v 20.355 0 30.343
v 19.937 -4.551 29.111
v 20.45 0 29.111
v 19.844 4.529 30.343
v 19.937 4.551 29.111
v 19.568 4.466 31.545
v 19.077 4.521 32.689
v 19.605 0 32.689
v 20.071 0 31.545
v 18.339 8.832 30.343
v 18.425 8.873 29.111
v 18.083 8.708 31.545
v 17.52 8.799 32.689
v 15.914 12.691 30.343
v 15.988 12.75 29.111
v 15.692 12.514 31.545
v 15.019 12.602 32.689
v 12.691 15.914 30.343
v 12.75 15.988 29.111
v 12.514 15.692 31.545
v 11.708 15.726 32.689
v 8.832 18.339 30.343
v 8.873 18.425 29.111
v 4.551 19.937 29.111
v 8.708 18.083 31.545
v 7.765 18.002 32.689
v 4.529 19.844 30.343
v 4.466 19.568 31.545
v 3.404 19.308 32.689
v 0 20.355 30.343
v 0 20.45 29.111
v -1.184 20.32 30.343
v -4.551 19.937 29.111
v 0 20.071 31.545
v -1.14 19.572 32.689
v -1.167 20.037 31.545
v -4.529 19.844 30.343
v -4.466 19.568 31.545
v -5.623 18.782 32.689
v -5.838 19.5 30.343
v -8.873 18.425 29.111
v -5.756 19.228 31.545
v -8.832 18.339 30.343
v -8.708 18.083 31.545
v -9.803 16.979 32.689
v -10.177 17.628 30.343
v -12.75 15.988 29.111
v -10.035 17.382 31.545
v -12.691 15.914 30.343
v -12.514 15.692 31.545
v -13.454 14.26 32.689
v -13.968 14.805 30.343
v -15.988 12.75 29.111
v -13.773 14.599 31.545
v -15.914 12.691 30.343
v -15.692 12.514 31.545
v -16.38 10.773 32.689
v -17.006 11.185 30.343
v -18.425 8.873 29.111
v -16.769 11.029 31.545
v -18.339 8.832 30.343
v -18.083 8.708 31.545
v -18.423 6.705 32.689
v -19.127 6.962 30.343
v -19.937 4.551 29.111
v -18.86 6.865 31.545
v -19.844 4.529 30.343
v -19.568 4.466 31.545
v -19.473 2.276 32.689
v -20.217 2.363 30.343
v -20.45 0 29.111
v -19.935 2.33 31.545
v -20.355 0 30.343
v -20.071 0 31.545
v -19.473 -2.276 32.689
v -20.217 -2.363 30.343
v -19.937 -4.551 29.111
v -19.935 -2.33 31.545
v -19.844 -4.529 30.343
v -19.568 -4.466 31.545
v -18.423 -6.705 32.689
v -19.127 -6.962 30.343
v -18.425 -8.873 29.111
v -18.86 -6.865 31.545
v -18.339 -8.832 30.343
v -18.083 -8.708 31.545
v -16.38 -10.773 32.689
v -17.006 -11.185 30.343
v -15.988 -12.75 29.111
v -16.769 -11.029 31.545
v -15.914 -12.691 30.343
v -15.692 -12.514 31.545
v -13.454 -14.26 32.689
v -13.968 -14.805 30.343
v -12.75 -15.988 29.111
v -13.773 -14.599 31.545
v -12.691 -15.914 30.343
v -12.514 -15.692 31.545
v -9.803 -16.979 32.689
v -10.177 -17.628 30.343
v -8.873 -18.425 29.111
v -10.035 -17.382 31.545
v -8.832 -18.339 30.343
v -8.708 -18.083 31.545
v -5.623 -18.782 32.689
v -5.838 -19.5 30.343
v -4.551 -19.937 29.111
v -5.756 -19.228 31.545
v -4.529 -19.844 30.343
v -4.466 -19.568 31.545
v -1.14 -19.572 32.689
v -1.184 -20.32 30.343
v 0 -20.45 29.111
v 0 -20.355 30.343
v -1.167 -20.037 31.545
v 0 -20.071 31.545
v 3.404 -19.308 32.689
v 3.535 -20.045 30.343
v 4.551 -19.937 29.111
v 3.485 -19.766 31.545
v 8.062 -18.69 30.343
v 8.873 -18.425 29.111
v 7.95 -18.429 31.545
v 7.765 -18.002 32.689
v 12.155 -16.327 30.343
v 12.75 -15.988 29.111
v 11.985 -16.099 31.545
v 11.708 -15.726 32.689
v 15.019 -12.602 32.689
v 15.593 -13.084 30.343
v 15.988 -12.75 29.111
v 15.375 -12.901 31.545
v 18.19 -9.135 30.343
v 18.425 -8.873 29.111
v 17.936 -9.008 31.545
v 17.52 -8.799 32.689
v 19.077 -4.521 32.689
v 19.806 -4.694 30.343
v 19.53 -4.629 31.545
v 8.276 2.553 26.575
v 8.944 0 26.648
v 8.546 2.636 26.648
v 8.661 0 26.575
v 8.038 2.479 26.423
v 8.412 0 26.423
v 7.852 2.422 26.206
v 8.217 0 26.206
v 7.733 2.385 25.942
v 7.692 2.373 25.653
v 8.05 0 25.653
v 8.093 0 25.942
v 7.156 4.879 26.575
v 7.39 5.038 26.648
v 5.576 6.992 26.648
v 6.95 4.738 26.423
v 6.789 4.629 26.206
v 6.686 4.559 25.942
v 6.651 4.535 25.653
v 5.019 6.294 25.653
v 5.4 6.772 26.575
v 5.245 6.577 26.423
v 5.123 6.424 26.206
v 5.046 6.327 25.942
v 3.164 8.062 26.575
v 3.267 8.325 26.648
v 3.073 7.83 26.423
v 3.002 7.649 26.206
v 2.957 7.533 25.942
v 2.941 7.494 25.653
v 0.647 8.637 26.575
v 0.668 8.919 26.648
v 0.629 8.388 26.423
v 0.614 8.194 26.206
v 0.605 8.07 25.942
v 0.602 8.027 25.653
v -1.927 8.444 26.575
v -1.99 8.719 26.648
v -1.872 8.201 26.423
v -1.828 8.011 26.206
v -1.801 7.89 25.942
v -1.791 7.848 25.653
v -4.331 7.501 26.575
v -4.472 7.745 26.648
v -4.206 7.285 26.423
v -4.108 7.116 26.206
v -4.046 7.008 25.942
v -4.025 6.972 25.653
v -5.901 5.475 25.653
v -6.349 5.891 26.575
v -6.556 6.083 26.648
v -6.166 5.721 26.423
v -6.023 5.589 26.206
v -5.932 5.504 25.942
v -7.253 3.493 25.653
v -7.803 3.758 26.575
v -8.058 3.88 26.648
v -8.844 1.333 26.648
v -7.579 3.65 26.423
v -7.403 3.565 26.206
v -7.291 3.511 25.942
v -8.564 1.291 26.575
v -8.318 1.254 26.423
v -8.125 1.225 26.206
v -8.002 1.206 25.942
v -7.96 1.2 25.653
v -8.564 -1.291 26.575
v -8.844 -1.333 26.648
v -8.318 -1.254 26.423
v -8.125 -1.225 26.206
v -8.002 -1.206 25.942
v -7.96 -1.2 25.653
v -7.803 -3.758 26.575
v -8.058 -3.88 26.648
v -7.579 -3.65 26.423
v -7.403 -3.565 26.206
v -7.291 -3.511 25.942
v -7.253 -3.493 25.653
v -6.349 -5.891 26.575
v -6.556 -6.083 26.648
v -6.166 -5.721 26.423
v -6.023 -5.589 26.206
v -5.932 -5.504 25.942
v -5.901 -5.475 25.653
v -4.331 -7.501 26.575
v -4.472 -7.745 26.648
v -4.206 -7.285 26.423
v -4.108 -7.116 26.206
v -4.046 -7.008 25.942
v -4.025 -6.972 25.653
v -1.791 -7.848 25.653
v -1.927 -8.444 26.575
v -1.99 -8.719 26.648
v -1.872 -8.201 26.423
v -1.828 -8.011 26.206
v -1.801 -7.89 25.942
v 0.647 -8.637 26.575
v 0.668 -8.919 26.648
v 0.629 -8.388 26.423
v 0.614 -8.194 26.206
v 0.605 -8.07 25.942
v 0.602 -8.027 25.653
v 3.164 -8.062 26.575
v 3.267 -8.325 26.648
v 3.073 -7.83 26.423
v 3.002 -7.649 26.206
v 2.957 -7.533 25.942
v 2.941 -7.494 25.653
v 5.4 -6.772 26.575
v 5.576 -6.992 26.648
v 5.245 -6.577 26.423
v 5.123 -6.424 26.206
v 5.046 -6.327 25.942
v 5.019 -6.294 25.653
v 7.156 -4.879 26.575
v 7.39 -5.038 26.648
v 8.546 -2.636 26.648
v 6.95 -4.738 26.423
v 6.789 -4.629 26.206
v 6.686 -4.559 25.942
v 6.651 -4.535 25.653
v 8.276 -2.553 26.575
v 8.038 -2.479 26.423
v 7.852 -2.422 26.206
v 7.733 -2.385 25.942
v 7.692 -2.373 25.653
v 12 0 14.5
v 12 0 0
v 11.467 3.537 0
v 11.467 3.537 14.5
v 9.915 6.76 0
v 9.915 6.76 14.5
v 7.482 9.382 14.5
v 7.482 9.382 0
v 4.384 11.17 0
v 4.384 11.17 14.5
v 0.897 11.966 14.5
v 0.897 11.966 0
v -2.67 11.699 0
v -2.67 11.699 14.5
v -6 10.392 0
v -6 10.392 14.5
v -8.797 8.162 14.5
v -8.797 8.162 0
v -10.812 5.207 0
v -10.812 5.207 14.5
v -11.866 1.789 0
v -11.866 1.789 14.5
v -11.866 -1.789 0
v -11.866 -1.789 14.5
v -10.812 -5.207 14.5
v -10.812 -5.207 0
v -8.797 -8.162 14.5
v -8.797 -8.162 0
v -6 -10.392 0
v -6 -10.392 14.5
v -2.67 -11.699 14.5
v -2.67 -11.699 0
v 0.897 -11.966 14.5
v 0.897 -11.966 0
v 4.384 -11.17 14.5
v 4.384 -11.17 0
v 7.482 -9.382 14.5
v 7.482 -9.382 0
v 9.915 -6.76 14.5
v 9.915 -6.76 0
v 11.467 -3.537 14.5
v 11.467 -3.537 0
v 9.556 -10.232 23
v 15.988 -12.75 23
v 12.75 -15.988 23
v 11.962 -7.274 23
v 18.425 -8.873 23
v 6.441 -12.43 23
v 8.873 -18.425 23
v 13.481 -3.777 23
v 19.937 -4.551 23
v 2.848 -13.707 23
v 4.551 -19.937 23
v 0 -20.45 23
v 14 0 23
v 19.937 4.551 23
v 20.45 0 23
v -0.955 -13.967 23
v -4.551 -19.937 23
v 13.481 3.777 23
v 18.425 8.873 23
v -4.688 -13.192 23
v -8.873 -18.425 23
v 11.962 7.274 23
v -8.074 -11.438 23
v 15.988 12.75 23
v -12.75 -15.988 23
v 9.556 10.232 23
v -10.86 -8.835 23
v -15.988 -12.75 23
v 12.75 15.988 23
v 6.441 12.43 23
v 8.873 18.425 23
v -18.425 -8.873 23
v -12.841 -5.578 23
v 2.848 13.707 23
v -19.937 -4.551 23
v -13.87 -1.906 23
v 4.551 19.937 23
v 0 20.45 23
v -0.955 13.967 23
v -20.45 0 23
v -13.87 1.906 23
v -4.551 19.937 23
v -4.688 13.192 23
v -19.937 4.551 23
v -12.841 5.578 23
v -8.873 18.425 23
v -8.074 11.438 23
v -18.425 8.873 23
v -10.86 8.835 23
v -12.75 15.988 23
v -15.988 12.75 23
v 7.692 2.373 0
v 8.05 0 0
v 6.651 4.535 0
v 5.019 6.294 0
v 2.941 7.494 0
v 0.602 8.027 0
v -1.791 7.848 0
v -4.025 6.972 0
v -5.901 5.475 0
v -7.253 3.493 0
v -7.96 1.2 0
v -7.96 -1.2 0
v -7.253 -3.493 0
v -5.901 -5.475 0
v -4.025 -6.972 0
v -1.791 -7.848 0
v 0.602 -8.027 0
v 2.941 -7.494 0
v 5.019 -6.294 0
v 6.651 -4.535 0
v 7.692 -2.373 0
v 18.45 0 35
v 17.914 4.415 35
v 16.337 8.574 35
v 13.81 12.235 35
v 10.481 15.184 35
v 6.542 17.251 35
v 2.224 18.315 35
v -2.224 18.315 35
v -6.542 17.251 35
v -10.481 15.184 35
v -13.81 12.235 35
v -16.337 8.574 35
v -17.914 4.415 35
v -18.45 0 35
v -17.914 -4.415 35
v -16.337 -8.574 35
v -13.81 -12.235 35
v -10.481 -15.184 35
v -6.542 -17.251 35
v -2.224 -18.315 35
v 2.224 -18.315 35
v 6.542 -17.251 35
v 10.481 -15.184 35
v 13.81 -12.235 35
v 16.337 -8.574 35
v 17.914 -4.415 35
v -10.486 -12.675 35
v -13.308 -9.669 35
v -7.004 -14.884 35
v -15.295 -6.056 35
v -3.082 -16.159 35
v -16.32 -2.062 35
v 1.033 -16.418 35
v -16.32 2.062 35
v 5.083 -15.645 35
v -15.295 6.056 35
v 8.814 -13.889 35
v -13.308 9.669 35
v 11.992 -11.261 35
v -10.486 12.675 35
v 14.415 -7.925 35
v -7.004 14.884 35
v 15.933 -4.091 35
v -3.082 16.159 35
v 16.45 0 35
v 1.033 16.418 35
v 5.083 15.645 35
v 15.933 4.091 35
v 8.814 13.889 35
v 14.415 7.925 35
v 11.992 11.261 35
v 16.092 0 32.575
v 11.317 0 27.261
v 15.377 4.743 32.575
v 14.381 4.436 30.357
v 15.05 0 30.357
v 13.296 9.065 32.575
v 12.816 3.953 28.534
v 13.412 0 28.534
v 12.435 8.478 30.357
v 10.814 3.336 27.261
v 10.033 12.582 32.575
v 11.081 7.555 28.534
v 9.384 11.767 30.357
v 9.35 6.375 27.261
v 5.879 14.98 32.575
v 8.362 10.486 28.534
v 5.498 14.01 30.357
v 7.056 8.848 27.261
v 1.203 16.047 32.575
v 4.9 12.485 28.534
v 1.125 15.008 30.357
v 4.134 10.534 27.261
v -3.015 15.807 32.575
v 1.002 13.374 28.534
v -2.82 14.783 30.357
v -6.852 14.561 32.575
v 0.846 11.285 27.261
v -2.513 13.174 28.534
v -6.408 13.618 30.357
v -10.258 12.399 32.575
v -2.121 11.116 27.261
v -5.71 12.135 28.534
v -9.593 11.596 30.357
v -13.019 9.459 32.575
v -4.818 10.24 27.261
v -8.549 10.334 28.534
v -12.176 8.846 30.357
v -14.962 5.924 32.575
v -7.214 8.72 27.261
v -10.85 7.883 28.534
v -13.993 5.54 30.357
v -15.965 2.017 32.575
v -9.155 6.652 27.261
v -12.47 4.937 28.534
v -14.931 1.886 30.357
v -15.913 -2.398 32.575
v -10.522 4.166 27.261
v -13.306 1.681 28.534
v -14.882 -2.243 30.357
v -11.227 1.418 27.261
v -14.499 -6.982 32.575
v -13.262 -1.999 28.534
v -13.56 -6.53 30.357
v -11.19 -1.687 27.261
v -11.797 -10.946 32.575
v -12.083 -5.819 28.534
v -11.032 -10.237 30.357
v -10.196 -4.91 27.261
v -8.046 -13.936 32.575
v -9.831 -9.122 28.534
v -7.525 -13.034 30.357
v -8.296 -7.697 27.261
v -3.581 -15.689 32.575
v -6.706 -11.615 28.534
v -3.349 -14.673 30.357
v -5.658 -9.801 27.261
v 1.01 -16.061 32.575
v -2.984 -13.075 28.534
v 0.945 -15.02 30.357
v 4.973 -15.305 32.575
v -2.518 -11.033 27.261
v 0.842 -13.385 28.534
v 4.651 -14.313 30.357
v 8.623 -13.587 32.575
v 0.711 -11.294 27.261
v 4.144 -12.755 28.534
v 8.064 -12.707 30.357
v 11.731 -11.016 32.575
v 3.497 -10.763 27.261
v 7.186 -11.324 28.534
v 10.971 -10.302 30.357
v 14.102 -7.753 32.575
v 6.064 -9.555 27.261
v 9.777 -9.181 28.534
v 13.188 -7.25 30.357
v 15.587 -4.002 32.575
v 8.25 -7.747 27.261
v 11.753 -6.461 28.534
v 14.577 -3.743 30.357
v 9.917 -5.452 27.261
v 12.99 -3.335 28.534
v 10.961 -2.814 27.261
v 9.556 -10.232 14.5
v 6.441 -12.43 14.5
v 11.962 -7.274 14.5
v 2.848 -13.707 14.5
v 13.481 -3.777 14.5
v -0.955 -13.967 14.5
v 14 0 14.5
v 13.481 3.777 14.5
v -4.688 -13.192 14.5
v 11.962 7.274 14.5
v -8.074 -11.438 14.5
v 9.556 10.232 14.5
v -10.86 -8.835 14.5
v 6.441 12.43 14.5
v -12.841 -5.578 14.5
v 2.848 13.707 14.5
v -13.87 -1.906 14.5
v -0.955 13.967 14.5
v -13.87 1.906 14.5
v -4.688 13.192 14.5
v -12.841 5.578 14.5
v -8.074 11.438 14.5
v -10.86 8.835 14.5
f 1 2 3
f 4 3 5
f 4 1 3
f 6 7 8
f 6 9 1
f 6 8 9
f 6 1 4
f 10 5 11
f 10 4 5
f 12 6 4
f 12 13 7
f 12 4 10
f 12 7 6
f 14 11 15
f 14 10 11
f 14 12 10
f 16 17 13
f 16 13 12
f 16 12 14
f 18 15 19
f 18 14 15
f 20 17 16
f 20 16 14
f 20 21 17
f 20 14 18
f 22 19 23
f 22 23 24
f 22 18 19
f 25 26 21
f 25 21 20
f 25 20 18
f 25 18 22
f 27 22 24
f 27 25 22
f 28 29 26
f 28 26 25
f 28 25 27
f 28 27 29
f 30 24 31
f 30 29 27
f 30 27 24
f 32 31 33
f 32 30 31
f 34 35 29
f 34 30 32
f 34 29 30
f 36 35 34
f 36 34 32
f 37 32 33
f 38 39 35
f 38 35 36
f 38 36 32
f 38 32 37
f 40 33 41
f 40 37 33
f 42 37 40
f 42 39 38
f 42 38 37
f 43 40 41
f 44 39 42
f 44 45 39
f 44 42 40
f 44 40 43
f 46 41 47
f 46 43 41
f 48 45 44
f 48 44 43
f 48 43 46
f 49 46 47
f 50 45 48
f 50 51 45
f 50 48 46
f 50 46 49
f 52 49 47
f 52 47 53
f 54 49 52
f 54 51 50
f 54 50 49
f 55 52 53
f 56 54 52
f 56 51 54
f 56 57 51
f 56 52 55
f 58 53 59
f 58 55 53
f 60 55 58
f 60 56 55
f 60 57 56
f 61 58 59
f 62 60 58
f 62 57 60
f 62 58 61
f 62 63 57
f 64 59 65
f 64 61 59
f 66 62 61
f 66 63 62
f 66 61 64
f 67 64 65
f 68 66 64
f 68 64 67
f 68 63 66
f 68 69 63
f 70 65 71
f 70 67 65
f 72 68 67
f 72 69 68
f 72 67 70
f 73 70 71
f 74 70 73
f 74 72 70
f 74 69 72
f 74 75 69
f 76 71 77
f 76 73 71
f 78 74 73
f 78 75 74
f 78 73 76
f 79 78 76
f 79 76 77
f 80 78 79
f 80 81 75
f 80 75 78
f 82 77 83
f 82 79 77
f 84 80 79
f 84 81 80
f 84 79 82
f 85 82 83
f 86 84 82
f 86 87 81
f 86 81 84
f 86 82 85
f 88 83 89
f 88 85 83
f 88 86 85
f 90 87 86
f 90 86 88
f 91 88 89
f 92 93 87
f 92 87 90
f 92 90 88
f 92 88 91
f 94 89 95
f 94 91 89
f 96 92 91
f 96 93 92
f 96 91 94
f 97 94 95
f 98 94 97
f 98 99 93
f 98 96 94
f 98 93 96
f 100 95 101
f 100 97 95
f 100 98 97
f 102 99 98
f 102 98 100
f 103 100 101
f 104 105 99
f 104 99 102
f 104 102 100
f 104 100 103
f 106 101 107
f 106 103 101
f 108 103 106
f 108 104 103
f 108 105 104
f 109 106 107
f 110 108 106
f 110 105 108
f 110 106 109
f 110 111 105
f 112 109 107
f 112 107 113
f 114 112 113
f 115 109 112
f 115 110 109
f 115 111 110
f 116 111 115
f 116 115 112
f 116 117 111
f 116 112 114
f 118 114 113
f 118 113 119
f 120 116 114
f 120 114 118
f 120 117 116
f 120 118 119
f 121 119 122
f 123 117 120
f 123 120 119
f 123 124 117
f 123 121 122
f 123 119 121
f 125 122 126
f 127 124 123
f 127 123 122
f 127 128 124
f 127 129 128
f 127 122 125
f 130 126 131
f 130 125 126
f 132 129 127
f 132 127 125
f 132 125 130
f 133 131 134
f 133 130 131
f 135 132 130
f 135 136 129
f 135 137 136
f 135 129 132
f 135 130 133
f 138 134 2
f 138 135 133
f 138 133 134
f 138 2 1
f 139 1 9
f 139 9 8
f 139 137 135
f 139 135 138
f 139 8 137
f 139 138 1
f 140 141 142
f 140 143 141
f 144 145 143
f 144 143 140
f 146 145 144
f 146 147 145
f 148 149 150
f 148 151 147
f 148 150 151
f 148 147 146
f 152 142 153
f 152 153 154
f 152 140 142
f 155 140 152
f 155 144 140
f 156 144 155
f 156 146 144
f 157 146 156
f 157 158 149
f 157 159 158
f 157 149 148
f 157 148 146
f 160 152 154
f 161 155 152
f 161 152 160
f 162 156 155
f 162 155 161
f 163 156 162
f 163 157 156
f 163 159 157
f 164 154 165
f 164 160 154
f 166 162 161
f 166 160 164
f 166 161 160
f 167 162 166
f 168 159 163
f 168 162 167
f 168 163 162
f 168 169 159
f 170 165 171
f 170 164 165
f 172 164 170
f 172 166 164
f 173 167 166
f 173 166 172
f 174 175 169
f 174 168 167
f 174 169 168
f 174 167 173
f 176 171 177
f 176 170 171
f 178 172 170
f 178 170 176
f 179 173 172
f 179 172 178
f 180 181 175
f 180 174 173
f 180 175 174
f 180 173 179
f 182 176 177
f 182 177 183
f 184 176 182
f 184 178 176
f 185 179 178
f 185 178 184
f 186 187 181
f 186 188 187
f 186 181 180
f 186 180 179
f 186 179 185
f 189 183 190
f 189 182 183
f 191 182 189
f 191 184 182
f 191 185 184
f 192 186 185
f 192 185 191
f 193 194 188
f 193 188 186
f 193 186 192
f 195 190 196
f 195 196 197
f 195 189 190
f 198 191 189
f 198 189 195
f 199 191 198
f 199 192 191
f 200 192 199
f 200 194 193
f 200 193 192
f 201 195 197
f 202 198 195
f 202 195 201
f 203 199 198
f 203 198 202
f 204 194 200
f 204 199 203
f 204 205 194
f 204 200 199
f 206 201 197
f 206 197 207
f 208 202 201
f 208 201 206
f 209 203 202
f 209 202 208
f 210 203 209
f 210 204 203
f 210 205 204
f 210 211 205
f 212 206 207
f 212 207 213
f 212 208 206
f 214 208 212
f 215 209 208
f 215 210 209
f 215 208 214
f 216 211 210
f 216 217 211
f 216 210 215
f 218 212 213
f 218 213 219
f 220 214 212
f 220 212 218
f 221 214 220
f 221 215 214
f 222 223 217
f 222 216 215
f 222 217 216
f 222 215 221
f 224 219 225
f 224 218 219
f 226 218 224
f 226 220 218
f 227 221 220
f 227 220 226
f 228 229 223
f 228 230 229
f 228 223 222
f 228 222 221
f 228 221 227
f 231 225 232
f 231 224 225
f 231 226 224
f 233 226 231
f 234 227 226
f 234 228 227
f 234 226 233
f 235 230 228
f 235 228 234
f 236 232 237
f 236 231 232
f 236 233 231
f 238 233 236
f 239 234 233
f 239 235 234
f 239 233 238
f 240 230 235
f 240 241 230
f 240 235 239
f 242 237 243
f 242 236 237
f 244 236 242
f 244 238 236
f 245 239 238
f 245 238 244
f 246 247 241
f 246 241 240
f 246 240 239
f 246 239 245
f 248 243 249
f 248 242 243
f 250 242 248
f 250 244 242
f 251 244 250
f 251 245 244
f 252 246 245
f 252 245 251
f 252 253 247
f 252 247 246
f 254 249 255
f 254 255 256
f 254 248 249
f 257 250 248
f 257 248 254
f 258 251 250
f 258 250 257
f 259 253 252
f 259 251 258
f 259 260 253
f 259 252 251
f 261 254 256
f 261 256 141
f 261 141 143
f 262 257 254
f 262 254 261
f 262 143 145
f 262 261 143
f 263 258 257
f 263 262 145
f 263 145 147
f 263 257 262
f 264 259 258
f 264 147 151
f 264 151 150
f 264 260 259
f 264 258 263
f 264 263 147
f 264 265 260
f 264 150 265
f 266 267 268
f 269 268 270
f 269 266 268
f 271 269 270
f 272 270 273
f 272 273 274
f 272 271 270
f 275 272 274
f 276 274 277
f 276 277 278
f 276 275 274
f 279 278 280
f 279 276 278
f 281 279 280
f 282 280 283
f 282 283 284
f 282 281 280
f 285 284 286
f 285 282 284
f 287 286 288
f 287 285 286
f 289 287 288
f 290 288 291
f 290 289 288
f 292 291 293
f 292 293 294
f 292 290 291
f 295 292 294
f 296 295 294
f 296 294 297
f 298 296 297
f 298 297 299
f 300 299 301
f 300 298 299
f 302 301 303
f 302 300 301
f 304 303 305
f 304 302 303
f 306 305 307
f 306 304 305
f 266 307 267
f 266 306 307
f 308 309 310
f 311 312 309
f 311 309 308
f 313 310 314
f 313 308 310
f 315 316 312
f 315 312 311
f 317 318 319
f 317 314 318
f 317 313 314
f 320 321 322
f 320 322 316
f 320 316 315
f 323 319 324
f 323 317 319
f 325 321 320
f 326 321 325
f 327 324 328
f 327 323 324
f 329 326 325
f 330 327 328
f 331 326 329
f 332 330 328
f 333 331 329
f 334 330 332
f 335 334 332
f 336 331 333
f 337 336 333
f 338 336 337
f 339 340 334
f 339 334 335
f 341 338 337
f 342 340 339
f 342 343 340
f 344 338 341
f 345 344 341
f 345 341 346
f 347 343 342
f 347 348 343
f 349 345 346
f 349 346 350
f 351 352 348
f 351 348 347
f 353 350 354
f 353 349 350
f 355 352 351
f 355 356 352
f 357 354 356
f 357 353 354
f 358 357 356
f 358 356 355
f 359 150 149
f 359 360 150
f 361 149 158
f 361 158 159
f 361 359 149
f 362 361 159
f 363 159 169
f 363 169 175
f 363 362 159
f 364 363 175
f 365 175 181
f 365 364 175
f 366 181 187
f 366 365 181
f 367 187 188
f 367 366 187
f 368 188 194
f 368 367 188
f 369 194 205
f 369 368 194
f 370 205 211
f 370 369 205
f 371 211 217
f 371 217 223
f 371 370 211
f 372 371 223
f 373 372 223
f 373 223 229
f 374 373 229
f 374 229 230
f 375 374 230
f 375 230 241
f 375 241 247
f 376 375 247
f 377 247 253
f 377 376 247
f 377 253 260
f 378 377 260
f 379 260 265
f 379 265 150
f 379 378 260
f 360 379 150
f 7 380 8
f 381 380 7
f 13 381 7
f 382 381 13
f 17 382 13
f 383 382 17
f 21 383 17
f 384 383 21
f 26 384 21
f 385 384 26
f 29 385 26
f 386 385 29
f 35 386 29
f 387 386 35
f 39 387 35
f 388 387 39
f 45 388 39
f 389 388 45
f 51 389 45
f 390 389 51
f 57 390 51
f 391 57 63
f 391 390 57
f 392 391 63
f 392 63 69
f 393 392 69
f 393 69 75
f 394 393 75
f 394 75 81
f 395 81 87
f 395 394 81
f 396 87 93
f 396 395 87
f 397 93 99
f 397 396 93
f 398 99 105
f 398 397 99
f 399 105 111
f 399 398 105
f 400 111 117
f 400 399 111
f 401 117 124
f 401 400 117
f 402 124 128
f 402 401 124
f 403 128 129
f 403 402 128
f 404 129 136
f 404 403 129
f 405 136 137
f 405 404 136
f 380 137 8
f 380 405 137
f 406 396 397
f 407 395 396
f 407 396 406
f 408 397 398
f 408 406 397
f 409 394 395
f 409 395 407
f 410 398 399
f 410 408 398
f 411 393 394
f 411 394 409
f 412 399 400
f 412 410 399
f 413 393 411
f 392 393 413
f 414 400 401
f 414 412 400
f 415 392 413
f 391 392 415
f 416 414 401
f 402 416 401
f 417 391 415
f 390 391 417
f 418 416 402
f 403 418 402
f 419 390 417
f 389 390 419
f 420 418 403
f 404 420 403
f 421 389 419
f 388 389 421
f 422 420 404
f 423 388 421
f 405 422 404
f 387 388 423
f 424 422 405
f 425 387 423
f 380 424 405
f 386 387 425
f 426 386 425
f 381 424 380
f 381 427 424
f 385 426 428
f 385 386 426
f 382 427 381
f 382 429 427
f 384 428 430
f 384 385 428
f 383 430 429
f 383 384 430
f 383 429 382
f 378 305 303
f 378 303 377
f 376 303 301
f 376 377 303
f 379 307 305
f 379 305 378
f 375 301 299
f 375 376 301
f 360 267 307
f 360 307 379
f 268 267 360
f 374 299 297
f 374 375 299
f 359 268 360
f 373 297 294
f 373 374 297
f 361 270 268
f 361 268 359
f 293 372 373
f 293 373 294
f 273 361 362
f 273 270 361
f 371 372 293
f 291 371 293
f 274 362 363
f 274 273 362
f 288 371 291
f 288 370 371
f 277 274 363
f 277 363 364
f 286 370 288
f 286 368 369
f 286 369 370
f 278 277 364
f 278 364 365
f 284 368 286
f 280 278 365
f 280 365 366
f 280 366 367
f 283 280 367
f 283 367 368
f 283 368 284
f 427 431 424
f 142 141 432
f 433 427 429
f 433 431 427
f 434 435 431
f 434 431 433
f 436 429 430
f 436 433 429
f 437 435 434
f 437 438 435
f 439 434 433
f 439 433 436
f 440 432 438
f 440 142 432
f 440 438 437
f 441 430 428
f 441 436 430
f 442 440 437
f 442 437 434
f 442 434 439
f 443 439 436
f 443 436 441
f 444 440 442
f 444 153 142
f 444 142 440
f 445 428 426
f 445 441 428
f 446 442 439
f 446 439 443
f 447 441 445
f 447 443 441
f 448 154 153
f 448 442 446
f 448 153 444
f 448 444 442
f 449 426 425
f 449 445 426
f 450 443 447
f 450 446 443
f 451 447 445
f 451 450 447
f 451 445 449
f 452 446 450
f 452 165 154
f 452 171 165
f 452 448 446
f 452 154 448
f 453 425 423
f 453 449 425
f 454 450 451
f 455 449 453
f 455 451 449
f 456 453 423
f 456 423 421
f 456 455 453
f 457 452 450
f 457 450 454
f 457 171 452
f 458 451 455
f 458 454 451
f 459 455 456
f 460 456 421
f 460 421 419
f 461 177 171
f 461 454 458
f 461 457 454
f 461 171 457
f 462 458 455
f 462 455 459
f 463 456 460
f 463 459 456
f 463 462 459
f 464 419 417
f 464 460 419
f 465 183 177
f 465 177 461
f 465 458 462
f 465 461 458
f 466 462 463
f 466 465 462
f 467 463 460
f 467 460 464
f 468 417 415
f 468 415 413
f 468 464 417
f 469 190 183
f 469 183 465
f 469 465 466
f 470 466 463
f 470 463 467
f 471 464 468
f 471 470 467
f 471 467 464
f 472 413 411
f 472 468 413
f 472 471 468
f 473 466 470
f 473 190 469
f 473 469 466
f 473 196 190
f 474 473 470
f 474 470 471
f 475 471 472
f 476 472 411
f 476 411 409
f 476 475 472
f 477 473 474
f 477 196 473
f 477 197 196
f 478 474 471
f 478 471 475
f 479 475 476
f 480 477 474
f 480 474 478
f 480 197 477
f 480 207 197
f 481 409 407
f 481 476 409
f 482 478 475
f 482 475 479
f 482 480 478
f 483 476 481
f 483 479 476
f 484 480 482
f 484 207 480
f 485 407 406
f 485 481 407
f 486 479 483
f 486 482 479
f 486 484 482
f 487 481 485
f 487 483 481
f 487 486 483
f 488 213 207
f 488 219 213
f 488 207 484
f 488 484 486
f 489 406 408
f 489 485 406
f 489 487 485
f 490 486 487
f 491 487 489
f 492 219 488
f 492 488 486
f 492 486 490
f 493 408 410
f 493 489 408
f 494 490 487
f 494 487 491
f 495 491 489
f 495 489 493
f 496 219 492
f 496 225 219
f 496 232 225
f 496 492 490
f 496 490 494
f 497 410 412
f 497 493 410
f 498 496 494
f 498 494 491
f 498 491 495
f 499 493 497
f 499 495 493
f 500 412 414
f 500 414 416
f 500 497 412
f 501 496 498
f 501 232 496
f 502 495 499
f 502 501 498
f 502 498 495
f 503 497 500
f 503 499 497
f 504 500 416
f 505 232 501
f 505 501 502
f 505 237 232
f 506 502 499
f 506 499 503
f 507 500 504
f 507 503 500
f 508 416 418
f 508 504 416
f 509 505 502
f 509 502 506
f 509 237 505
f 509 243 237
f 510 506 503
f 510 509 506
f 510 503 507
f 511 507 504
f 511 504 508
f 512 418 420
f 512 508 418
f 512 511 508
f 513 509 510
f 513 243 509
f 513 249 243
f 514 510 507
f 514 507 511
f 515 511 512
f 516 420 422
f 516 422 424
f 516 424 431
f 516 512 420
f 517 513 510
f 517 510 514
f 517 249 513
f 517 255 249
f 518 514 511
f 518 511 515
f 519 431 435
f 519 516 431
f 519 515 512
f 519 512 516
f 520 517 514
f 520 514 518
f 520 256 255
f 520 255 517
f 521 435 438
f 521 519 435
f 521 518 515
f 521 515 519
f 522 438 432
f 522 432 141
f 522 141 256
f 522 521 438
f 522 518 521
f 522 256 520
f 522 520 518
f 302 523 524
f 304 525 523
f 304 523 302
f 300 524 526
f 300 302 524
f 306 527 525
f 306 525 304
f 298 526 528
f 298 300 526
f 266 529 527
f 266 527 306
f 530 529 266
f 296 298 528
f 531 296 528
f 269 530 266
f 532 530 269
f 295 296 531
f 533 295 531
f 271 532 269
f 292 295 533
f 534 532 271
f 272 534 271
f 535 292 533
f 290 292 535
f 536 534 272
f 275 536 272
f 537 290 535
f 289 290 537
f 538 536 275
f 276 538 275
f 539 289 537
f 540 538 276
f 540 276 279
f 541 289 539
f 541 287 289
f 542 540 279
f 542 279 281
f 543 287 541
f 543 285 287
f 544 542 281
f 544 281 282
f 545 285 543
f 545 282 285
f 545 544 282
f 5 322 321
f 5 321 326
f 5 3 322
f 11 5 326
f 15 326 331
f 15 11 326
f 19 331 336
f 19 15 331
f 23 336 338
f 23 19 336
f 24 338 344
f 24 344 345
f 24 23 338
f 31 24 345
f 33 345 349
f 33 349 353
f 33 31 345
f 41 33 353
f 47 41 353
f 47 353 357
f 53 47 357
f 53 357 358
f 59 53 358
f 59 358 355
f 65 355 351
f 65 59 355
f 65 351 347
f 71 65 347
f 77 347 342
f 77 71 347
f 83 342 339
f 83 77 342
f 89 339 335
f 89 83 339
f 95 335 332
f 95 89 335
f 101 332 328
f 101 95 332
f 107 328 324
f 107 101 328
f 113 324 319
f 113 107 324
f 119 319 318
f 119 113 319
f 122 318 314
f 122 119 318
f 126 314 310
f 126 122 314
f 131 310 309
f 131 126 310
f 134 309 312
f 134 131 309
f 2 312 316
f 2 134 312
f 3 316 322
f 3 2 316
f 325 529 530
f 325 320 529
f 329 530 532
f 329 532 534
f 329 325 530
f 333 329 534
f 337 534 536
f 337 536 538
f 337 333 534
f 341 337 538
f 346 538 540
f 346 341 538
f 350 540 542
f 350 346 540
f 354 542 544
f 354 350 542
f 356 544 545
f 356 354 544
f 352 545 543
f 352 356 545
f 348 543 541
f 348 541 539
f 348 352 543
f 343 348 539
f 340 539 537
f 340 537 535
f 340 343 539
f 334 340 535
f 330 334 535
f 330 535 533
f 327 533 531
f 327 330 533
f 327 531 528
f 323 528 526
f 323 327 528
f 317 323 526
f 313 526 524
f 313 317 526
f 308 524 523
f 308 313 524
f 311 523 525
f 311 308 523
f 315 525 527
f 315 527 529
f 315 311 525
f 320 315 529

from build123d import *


with BuildPart() as f1:
    # F0 (on Front) → F1 (revolve)
    with BuildSketch(Plane.XZ):
        with BuildLine():
            Line((8.05, 25.653343), (8.05, 0))
            Line((8.05, 0), (12, 0))
            Line((12, 0), (12, 14.5))
            Line((12, 14.5), (14, 14.5))
            Line((14, 14.5), (14, 23))
            Line((14, 23), (20.45, 23))
            Line((20.45, 23), (20.45, 29.111456))
            ThreePointArc((20.45, 29.111456), (20.235992, 30.94948), (19.605418, 32.689165))
            Line((19.605418, 32.689165), (18.45, 35))
            Line((18.45, 35), (16.45, 35))
            ThreePointArc((16.45, 35), (14.297655, 29.385126), (8.943617, 26.647668))
            ThreePointArc((8.943617, 26.647668), (8.306232, 26.32178), (8.05, 25.653343))
        make_face()
    revolve(axis=Axis((0, 0, 17.5), (0, 0, 1)))


solid = f1.part
